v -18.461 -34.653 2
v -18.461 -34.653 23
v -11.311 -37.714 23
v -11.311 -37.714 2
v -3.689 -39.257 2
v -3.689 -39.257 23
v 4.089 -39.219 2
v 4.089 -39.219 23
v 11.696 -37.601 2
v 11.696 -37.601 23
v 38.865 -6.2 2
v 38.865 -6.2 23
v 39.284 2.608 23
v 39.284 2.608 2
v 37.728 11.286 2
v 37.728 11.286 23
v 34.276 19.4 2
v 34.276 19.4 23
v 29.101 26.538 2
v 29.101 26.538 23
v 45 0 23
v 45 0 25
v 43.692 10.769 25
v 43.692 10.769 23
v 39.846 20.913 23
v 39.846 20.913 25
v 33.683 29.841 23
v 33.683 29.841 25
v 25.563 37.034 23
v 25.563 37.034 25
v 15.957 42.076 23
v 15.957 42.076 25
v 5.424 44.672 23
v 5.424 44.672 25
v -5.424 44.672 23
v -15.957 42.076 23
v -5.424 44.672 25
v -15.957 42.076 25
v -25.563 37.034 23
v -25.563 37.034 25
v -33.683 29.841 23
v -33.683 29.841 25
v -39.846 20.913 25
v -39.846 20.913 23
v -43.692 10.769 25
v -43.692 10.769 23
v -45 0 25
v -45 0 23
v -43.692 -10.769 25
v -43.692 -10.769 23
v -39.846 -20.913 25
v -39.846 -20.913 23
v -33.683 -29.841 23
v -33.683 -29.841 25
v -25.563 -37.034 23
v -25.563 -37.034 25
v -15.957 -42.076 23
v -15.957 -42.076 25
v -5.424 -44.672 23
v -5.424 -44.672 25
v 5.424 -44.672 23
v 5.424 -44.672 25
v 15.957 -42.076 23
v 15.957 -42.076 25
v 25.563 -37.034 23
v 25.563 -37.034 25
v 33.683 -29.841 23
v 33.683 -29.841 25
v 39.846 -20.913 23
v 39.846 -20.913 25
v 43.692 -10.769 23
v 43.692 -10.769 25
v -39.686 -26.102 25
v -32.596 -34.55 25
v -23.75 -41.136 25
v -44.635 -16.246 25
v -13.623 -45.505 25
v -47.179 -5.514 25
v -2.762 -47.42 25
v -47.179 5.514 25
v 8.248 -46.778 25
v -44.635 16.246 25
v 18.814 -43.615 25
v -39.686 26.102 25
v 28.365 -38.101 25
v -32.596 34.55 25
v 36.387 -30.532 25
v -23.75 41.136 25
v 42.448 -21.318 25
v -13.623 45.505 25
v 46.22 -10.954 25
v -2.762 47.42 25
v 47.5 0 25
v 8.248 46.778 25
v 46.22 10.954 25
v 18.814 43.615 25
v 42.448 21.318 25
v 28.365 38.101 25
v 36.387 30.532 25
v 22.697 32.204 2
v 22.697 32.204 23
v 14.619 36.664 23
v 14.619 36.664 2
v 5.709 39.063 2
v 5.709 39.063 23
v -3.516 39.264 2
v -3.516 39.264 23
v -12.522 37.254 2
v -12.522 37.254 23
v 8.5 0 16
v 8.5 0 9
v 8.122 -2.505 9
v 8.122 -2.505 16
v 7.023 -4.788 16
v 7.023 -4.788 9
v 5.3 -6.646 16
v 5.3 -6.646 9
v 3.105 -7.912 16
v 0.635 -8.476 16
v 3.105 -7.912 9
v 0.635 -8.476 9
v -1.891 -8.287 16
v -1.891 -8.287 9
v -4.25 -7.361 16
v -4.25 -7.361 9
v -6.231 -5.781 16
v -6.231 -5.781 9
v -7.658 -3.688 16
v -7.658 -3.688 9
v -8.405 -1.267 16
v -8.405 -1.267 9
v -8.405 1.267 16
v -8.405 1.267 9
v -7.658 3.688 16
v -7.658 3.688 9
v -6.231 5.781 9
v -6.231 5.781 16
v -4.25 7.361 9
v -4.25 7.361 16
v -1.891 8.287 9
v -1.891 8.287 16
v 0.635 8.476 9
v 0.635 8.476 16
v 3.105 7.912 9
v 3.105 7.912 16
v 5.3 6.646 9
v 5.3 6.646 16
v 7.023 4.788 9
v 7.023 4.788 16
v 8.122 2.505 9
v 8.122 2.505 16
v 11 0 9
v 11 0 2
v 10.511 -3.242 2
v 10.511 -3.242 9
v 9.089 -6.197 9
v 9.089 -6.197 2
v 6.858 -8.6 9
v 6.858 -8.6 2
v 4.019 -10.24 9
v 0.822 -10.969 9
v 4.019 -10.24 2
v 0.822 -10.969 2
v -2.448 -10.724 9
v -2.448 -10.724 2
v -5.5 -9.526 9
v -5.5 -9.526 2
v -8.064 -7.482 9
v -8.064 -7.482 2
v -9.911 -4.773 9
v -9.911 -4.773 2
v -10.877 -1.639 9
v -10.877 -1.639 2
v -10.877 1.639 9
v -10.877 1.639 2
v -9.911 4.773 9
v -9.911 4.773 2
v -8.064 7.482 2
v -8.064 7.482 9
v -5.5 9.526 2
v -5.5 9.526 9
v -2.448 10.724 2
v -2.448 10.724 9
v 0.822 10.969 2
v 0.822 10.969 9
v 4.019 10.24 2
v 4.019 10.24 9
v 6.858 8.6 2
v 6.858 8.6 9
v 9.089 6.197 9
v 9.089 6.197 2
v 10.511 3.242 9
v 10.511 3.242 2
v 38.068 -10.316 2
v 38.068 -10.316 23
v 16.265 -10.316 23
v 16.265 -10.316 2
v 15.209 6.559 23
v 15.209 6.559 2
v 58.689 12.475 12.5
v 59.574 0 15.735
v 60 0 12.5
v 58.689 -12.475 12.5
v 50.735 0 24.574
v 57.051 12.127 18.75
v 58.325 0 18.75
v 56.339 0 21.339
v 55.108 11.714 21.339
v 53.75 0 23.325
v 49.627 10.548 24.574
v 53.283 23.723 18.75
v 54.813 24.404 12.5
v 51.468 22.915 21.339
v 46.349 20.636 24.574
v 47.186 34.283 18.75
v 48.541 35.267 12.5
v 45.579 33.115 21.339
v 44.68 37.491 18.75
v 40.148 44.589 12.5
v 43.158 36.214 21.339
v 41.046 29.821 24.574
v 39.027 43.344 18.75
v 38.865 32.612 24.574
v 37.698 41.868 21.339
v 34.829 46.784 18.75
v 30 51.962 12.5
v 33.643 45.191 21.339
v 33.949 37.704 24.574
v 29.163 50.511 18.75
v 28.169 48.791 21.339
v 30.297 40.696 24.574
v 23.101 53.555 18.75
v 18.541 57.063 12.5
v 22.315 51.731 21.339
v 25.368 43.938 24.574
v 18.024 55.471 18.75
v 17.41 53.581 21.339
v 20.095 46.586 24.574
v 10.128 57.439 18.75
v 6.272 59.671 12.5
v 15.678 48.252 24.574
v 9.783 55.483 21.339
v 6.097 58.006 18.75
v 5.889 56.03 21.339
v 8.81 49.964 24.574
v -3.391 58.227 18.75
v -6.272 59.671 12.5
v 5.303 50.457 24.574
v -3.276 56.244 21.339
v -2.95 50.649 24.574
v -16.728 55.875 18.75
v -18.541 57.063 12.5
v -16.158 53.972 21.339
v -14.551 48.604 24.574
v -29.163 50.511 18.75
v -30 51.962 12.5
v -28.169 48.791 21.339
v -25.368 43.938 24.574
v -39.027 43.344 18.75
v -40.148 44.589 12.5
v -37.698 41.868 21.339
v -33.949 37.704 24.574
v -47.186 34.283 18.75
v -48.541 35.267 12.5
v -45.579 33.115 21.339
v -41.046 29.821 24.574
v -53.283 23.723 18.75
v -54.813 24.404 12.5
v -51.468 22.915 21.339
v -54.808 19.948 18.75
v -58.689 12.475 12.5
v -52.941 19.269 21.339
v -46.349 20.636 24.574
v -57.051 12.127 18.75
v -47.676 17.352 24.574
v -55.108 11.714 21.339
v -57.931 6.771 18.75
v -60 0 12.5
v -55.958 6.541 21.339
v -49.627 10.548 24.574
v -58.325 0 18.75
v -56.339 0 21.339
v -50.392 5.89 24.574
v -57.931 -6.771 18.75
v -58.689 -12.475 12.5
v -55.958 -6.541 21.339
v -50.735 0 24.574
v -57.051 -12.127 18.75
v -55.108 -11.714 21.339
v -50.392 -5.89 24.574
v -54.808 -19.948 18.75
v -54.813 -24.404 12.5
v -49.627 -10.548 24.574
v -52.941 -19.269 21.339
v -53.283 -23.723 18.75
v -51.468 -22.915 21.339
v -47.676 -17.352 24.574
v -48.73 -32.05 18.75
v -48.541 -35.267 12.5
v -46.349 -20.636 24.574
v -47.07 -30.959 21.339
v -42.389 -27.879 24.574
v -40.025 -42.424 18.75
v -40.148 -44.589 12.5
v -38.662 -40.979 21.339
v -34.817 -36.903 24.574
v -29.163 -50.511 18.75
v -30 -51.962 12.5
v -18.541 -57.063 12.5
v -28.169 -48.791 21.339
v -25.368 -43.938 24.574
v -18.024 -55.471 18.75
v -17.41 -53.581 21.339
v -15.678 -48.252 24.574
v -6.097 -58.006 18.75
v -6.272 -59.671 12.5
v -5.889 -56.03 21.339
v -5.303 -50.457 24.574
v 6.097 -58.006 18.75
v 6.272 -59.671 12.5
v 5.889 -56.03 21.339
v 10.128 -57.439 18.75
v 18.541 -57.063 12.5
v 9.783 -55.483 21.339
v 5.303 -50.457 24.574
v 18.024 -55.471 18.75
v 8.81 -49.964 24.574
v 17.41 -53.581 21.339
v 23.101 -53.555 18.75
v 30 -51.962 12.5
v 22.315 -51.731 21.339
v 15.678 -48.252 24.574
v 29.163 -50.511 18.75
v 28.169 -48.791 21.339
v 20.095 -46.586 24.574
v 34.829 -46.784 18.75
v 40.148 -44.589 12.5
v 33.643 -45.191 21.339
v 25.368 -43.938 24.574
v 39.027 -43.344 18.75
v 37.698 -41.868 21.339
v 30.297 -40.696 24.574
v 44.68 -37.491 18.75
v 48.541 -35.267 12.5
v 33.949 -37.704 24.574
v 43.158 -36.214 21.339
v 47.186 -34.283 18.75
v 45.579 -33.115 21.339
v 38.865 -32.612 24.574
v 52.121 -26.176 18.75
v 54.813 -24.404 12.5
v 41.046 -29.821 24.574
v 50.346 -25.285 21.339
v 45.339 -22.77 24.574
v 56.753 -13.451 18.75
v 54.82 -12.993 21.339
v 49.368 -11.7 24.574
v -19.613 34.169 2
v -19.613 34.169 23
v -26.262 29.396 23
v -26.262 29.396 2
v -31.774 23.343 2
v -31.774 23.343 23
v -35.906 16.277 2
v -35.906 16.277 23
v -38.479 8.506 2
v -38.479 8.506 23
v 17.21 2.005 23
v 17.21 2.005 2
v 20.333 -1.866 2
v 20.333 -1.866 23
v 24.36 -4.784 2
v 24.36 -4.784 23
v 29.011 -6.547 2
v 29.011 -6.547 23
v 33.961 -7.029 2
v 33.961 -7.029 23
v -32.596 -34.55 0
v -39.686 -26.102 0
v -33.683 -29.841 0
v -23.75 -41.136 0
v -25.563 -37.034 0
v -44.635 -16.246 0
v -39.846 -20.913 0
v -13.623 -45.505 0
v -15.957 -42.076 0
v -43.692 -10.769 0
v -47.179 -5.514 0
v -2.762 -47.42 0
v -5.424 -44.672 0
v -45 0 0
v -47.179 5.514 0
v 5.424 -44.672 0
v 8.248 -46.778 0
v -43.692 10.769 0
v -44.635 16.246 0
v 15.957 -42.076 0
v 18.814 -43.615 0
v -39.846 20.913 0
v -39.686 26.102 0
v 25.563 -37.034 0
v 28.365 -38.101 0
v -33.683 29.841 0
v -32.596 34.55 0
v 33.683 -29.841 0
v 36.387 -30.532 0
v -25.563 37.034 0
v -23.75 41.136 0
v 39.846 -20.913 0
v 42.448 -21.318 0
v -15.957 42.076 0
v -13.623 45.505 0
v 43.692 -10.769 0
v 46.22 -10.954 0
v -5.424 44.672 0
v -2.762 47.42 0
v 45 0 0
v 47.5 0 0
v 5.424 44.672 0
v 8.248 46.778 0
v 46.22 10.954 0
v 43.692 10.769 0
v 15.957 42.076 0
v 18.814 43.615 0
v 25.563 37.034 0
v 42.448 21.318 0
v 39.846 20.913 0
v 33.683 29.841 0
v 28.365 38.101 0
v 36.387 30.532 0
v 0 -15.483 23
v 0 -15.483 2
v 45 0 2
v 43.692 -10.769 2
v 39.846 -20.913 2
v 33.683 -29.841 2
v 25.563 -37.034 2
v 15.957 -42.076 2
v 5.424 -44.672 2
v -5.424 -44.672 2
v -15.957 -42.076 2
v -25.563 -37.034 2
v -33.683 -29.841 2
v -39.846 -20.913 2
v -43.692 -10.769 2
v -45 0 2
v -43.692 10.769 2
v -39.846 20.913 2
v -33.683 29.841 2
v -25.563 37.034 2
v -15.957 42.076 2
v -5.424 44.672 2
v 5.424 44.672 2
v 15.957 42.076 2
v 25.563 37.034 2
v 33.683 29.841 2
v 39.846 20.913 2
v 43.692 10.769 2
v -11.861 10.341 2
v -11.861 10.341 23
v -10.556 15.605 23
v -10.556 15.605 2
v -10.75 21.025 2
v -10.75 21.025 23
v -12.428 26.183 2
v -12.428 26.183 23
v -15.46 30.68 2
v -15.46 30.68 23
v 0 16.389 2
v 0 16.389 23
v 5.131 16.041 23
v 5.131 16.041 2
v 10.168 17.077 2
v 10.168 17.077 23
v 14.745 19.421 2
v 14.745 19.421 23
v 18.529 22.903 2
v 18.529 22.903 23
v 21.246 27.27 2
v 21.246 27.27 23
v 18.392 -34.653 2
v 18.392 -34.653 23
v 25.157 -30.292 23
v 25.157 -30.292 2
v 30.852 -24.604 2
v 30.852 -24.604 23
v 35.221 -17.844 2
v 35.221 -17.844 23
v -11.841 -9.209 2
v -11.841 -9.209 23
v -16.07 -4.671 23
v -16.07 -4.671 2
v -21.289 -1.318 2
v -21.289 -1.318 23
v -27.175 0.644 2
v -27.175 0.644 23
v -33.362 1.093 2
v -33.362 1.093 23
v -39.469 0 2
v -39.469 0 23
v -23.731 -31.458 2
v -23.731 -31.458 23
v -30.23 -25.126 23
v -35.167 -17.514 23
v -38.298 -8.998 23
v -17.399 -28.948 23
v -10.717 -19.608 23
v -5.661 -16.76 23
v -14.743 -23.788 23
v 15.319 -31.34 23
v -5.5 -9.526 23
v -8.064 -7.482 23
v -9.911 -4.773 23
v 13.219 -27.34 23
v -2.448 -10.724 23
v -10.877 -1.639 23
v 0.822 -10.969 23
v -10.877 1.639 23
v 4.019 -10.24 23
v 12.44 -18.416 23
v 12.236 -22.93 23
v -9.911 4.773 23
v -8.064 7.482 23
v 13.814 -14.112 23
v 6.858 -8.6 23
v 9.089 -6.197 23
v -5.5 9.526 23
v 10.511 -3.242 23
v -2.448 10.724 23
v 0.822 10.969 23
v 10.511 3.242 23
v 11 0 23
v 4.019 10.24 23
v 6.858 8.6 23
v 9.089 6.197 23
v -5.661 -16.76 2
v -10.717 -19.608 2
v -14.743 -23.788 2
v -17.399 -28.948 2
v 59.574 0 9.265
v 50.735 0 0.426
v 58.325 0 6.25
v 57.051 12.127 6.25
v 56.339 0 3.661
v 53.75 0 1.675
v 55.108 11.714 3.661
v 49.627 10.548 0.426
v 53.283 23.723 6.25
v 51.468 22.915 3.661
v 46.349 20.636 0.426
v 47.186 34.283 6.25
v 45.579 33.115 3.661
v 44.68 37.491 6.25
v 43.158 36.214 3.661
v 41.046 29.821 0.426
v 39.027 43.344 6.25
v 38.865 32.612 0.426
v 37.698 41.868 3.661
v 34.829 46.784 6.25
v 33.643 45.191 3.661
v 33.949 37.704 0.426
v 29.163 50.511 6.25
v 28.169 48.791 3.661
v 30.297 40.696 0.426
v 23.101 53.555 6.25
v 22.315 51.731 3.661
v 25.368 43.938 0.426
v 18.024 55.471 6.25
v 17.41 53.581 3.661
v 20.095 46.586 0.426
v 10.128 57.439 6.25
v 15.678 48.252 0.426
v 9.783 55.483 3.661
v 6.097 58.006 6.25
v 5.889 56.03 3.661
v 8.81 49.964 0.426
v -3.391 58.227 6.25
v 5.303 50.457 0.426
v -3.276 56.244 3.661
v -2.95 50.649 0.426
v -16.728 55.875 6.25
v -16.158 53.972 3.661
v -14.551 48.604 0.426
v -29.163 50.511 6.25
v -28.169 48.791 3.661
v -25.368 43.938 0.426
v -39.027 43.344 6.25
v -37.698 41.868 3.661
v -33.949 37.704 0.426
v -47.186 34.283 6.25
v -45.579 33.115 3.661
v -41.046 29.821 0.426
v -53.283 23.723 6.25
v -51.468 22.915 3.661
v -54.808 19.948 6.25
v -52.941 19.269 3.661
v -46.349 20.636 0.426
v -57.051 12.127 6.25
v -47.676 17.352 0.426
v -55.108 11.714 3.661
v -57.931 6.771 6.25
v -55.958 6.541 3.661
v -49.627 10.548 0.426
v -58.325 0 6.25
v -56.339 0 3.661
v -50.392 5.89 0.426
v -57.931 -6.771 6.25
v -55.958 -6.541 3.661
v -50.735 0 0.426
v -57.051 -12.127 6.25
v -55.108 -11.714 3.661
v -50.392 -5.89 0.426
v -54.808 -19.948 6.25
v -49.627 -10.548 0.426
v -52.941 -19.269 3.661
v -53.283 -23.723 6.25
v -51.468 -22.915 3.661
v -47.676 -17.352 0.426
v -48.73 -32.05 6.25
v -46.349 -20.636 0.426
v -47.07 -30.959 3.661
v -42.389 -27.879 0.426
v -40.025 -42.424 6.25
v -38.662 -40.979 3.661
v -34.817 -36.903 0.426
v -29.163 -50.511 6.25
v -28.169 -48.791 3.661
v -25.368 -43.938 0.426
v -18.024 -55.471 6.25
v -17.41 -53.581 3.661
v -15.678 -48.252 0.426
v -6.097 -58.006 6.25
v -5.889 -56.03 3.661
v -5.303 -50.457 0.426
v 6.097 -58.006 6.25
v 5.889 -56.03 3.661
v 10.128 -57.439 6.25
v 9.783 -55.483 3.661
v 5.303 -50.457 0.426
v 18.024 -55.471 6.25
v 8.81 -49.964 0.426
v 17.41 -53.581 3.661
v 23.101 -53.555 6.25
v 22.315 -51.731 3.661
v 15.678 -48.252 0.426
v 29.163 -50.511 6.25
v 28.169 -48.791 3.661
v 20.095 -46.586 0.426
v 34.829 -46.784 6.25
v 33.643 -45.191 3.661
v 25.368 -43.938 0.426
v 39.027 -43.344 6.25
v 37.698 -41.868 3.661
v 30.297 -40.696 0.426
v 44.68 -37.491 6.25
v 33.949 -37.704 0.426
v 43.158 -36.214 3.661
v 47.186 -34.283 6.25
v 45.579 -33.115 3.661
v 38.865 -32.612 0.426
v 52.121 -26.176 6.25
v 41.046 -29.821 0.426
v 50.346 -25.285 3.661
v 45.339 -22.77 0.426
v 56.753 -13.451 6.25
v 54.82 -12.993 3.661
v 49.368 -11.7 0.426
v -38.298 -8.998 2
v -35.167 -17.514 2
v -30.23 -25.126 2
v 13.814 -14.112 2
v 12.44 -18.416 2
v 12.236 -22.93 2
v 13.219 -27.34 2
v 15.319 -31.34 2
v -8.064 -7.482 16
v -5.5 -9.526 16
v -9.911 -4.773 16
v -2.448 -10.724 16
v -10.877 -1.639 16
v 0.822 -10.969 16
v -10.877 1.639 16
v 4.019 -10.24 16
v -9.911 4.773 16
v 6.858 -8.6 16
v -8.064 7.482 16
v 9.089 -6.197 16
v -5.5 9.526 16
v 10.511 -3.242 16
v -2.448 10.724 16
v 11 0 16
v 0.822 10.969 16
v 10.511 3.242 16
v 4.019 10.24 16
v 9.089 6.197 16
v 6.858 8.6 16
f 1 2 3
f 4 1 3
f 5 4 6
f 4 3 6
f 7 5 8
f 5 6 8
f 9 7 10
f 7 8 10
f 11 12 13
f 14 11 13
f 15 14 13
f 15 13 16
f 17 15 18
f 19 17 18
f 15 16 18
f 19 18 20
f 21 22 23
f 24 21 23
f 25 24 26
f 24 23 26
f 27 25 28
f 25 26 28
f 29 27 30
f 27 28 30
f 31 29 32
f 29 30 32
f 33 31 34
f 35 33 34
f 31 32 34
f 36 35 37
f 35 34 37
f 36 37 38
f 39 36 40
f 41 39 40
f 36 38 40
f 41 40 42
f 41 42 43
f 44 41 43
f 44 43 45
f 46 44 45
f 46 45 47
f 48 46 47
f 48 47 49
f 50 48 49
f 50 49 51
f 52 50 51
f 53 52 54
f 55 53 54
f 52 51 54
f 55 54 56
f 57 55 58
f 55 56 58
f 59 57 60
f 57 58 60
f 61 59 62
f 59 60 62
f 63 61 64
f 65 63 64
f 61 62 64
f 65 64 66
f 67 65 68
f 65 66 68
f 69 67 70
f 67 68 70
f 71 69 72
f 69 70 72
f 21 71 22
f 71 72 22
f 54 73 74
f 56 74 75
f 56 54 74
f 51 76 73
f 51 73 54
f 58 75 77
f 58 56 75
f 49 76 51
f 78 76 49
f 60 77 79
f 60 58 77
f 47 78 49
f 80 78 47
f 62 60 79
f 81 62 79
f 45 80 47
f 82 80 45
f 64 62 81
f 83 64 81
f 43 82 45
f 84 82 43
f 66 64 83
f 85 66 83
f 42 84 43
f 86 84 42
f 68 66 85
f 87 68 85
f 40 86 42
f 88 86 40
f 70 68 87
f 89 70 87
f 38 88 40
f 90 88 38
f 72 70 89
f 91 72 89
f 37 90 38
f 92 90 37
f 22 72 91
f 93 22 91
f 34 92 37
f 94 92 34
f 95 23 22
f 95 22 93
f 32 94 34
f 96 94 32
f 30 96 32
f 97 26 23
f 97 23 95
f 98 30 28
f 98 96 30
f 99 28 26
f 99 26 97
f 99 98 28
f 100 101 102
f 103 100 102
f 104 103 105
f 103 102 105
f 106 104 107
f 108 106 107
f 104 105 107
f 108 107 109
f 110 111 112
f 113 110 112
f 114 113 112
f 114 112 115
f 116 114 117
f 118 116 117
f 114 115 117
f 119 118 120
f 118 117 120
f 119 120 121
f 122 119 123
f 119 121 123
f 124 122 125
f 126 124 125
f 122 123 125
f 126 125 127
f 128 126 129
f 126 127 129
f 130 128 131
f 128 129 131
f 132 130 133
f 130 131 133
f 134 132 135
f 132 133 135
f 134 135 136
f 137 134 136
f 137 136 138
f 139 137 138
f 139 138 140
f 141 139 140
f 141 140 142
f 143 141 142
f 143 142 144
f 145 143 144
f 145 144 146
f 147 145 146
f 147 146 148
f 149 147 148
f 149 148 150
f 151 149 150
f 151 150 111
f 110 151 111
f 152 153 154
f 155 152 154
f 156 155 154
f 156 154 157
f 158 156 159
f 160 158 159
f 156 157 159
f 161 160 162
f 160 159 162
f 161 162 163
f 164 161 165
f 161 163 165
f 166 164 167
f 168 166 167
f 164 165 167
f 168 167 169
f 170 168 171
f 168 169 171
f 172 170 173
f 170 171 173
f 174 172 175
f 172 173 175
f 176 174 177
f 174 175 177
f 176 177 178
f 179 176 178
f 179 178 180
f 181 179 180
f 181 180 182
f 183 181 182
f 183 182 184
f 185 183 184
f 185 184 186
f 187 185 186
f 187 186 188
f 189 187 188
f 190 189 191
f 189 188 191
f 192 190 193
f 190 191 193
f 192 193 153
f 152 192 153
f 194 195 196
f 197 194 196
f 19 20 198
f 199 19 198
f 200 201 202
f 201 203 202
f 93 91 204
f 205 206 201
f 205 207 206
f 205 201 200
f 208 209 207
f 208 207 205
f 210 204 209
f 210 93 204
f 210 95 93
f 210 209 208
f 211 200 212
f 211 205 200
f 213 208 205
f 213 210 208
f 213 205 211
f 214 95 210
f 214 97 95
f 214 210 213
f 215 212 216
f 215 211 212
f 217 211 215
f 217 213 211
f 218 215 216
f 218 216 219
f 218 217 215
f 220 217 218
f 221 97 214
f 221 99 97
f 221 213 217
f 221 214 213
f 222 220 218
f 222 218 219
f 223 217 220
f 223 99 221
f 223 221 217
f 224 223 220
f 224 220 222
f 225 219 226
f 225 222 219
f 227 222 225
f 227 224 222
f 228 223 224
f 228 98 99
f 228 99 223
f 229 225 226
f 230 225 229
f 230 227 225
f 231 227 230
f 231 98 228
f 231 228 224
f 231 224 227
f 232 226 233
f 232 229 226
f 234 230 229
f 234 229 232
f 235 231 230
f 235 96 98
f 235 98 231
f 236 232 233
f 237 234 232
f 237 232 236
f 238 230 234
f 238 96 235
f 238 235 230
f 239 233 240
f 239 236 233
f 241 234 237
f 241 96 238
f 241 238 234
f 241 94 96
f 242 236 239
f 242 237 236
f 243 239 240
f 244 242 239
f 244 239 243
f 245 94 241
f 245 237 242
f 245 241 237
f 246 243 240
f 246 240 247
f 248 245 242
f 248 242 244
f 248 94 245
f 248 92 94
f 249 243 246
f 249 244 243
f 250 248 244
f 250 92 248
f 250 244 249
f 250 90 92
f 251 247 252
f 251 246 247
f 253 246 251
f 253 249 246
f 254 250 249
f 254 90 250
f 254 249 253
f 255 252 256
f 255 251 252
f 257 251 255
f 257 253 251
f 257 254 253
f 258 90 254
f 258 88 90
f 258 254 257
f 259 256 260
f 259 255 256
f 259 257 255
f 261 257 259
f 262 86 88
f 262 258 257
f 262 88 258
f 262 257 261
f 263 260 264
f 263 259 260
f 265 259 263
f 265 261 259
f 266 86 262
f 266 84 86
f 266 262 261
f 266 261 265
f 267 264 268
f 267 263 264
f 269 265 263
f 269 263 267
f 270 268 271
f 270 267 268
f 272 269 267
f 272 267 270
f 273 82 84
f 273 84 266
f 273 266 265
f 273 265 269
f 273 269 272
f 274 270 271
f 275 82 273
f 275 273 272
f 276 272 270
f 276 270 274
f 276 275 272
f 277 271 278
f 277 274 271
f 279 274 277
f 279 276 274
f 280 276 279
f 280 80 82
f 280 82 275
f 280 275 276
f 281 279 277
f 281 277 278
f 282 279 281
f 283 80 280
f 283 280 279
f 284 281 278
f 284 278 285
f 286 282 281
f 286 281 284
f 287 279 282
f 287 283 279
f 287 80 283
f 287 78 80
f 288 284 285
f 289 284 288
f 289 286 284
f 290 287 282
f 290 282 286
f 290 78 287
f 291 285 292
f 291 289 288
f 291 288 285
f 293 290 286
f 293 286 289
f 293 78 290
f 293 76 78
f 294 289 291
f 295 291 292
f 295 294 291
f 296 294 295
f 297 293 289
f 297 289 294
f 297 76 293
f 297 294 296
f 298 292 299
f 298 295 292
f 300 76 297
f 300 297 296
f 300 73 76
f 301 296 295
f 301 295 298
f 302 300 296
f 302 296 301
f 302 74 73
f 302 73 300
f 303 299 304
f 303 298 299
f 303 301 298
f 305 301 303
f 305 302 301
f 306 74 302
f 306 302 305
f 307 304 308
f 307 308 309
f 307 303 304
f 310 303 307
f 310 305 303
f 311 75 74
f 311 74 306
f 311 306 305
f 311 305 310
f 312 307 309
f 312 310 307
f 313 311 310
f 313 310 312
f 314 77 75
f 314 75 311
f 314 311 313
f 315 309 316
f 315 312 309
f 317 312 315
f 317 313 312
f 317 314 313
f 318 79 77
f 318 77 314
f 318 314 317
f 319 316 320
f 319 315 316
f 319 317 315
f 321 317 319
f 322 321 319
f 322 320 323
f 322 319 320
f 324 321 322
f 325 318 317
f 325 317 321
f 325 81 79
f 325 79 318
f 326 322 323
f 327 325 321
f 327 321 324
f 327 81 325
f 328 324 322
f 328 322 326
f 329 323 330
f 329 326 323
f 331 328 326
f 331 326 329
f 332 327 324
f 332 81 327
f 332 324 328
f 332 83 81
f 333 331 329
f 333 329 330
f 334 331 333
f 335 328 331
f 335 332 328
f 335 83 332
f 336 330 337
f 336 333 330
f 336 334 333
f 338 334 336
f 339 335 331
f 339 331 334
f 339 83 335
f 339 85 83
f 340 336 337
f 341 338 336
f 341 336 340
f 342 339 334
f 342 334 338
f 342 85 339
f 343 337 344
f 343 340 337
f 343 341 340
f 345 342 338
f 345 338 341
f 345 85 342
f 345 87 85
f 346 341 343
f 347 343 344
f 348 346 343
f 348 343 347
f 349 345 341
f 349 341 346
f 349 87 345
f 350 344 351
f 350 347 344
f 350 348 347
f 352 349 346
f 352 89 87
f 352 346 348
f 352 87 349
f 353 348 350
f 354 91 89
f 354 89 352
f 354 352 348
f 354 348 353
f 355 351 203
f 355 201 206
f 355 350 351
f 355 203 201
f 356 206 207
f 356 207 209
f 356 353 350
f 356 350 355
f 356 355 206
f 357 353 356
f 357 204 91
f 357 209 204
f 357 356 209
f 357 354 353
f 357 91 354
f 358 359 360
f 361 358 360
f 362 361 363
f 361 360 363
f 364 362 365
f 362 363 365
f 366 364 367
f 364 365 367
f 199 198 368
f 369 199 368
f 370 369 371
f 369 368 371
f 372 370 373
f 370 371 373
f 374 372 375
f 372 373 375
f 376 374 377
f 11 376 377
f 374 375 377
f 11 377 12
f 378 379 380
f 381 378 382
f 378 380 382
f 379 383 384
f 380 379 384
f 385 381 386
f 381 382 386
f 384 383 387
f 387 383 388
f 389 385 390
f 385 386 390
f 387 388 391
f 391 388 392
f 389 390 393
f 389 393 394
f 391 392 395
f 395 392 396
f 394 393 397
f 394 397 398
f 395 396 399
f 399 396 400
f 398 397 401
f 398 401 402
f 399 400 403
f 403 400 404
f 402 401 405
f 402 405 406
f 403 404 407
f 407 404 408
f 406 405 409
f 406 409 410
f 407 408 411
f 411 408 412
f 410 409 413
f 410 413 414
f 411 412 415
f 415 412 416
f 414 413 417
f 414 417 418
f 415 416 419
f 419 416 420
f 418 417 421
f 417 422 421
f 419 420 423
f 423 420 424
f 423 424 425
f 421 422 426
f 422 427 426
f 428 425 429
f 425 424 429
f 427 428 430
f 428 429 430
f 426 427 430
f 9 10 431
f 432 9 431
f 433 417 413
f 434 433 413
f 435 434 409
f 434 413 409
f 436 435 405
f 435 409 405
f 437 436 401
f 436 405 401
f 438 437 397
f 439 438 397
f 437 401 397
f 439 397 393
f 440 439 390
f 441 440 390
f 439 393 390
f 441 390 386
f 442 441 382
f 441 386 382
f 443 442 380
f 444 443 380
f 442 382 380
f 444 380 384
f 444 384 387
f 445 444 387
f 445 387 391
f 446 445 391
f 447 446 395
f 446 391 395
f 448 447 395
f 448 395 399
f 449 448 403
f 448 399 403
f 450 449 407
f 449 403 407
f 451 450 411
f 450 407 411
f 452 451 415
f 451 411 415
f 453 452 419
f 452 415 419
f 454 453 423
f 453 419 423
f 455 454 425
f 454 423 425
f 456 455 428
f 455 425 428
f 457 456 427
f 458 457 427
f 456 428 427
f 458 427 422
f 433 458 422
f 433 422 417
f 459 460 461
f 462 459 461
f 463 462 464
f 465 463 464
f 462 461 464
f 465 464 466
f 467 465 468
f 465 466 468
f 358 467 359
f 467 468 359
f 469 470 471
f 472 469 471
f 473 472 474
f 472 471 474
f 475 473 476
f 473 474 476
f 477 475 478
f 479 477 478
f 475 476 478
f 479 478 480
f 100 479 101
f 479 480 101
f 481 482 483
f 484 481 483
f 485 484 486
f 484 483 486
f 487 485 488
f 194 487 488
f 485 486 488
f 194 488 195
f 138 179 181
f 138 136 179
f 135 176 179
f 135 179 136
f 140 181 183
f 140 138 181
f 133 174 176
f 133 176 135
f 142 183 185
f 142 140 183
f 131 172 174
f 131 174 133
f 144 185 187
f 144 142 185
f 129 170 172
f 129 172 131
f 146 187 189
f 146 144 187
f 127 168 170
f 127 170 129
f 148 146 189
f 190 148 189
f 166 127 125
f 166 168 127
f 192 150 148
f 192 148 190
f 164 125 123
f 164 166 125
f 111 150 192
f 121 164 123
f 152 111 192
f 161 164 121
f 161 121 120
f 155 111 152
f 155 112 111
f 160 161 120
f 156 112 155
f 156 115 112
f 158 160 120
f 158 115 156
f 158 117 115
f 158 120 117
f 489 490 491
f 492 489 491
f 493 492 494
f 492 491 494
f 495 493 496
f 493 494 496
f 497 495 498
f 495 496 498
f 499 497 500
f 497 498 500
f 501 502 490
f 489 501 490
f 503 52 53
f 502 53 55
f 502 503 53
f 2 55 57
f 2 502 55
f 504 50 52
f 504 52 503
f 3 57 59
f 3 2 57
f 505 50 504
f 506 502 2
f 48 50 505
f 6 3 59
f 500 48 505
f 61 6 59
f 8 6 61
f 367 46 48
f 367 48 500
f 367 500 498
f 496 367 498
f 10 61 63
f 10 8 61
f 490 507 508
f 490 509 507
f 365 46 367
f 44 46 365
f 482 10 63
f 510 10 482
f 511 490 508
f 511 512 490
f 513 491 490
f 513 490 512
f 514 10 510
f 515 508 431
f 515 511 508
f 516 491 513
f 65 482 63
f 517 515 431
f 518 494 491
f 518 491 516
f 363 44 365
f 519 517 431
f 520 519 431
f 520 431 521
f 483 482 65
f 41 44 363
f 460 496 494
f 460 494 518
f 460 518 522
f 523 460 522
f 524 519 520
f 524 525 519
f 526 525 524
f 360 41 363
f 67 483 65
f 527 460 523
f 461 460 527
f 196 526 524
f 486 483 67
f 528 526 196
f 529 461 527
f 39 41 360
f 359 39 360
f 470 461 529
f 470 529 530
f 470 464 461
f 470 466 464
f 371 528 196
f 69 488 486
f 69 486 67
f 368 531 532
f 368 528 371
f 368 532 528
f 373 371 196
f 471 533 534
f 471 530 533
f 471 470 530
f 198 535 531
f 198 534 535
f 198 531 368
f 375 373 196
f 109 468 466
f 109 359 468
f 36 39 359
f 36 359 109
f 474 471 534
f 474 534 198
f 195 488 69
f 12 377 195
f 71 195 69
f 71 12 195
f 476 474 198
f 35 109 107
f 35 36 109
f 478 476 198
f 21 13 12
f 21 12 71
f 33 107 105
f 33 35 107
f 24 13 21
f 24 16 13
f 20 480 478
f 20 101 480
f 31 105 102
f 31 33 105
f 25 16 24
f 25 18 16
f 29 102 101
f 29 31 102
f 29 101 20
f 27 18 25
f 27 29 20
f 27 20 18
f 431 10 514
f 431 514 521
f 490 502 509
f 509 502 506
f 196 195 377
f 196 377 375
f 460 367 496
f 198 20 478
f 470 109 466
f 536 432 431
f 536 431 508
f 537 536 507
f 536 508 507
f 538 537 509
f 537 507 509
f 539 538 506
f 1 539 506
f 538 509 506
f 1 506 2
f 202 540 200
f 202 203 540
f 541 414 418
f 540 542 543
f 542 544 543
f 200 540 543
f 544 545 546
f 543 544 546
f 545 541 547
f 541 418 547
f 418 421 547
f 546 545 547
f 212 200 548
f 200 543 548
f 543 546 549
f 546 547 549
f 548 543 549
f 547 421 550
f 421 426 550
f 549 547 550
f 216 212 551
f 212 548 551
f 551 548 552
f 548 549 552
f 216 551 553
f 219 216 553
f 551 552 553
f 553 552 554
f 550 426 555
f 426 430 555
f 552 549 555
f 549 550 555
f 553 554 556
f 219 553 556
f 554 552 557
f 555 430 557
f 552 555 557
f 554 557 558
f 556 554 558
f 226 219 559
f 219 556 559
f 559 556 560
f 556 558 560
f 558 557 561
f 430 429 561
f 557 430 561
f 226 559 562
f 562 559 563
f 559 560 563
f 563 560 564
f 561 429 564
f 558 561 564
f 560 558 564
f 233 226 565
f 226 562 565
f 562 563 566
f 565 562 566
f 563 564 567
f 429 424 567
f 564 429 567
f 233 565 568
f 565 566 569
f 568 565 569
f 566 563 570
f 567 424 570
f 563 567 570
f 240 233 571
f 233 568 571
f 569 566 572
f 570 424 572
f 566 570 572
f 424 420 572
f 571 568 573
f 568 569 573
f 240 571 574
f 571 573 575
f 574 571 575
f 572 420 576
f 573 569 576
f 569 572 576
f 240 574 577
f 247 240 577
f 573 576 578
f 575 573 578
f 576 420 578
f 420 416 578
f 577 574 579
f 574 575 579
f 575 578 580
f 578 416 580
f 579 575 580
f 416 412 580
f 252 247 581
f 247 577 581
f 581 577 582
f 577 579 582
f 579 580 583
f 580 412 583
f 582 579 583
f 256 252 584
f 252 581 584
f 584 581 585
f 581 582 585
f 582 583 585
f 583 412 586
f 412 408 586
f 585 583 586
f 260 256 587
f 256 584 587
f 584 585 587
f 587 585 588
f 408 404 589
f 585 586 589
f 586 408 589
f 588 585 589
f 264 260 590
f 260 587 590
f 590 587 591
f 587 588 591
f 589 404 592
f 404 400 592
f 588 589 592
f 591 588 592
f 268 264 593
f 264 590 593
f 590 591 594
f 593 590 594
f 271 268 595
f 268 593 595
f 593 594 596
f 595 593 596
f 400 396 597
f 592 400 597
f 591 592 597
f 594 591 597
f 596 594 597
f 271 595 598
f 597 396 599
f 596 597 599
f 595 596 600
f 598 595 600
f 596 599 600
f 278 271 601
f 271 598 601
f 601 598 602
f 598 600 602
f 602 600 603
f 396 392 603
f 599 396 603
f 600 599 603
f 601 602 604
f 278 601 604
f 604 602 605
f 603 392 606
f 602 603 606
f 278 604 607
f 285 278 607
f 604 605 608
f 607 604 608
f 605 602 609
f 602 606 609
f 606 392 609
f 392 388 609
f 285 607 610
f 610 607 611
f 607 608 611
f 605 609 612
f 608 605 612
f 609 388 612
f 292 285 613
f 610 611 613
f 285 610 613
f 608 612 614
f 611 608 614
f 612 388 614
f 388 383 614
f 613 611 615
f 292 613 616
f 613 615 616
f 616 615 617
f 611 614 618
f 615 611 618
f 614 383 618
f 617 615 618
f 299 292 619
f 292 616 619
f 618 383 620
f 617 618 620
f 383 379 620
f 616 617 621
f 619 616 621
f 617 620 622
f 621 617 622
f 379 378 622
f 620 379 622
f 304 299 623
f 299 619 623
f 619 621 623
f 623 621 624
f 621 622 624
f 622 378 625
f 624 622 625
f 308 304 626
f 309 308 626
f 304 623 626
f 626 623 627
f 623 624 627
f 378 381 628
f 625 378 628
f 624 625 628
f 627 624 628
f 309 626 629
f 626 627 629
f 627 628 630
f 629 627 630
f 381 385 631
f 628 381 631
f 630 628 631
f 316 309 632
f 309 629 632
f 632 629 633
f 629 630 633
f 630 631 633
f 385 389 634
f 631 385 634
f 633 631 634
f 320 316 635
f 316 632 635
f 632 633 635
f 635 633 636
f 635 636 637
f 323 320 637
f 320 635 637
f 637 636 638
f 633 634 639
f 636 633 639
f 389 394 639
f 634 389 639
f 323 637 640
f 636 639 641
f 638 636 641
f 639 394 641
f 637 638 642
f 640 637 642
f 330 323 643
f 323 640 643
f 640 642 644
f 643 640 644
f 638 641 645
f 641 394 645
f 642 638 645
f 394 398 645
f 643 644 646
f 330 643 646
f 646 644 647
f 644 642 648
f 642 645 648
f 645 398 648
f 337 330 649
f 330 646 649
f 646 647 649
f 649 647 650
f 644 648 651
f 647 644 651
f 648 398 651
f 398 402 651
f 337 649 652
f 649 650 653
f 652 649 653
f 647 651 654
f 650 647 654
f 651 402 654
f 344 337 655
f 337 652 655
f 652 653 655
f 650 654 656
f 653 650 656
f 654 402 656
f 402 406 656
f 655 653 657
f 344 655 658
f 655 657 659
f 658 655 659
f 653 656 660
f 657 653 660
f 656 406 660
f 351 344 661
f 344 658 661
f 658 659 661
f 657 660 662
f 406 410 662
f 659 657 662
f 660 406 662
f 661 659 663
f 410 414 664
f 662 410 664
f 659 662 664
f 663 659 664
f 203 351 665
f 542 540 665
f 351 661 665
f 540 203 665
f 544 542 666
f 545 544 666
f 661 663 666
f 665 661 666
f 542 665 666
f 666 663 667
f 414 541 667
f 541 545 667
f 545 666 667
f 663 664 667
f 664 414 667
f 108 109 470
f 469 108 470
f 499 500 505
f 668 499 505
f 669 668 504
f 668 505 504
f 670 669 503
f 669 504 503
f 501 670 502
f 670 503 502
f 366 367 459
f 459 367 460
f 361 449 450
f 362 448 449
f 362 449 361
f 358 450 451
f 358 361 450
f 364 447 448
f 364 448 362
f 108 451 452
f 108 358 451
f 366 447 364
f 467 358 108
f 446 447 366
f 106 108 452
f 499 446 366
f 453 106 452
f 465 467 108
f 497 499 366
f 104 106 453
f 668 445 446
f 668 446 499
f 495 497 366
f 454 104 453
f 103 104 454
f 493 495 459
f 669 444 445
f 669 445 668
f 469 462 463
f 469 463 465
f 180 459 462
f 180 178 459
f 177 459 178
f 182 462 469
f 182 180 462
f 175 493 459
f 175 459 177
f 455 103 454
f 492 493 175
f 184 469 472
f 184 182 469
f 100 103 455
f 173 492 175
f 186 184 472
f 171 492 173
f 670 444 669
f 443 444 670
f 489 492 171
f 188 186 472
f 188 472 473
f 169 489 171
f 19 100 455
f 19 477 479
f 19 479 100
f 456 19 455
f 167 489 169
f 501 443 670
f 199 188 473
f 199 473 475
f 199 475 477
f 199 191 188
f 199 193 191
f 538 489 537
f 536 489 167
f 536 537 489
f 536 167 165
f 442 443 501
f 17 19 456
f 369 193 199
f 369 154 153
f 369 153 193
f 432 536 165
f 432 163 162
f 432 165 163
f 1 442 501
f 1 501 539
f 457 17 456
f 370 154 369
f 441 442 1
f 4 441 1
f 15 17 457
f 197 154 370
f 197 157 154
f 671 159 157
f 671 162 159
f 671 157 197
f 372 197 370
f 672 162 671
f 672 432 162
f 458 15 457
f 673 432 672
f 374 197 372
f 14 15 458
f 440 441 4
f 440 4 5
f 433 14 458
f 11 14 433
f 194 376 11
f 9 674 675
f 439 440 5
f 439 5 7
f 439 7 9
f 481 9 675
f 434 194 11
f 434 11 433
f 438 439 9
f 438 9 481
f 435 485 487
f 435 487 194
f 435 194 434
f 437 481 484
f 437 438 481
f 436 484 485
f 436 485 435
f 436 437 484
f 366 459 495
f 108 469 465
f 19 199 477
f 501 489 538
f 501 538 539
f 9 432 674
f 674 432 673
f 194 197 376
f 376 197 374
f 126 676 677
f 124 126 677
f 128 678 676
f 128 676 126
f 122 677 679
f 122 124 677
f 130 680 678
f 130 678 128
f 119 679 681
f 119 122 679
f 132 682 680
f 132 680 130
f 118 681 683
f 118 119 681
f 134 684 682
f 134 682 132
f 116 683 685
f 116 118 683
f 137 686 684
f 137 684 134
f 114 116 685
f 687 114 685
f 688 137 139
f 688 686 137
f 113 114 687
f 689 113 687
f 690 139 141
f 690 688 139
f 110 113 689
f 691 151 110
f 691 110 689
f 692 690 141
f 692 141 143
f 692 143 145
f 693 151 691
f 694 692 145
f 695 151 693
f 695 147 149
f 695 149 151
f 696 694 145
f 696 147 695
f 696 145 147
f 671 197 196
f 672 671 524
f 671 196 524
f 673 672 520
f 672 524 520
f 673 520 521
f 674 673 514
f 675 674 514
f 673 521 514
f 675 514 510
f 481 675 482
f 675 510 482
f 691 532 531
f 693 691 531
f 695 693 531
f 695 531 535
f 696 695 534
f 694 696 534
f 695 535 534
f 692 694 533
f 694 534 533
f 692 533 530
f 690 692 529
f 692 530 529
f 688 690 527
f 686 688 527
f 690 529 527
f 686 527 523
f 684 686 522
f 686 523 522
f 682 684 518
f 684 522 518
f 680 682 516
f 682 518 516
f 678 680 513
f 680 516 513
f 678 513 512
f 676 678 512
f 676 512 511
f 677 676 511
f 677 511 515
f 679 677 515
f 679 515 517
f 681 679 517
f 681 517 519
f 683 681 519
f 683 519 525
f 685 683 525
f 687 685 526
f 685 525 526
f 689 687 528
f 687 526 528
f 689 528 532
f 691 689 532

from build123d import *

# Parameters (mm, degrees)
F0_R      = 60
F1_DEPTH  = 25
F2_R      = 45
F3_DEPTH  = 2
F4_R      = 11
F5_DEPTH  = 7
F6_R      = 45
F7_DEPTH  = 2
F8_R      = 11
F9_DEPTH  = 7
F10_R     = 8.5
F11_DEPTH = 25
F12_R     = 12.49999
F16_DEPTH = 25


# Not quite as in the source:
# - a fillet or chamfer is up to 0.001 mm smaller than in the source, because OpenCascade refuses the exact size


with BuildPart() as f1:
    # F0 (on Top) → F1 (new body)
    with BuildSketch(Plane.XY):
        Circle(F0_R)
    extrude(amount=F1_DEPTH)

    # F2 (on face) → F3 (cut)
    with BuildSketch(Plane.XY.offset(25)):
        Circle(F2_R)
    extrude(amount=-F3_DEPTH, mode=Mode.SUBTRACT)

    # F4 (on face) → F5 (cut)
    with BuildSketch(Plane.XY.offset(23)):
        Circle(F4_R)
    extrude(amount=-F5_DEPTH, mode=Mode.SUBTRACT)

    # F6 (on face) → F7 (cut)
    with BuildSketch(Plane(origin=(0, 0, 0), x_dir=(1, 0, 0), z_dir=(0, 0, -1))):
        Circle(F6_R)
    extrude(amount=-F7_DEPTH, mode=Mode.SUBTRACT)

    # F8 (on face) → F9 (cut)
    with BuildSketch(Plane(origin=(0, 0, 2), x_dir=(1, 0, 0), z_dir=(0, 0, -1))):
        Circle(F8_R)
    extrude(amount=-F9_DEPTH, mode=Mode.SUBTRACT)

    # F10 (on face) → F11 (cut)
    with BuildSketch(Plane(origin=(0, 0, 9), x_dir=(1, 0, 0), z_dir=(0, 0, -1))):
        Circle(F10_R)
    extrude(amount=-F11_DEPTH, mode=Mode.SUBTRACT)

    # F12 (radius 12.5 in the source; OpenCascade refuses exactly that, so slightly less here)
    f12_edges = [f1.edges().sort_by_distance(p)[0] for p in [
        (-60, 0, 25),
        (-60, 0, 0),
    ]]
    fillet(f12_edges, radius=F12_R)

    # F15 (on face) → F16 (cut)
    with BuildSketch(Plane.XY.offset(23)):
        with BuildLine():
            Line((-23.7309150398, -31.4583554864), (-11.8406927213, -9.2094279826))
            ThreePointArc((-11.8406927213, -9.2094279826), (-24.1709240611, -0.1529805421), (-39.4689776003, 0))
            ThreePointArc((-39.4689776003, 0), (-35.1668885168, -17.5136562569), (-23.7309150398, -31.4583554864))
        make_face()
        with BuildLine():
            Line((11.6958646104, -37.6011095941), (0, -15.4828215018))
            ThreePointArc((0, -15.4828215018), (-12.8825559704, -21.5513966495), (-18.4614025056, -34.6534699202))
            ThreePointArc((-18.4614025056, -34.6534699202), (-3.6886632813, -39.2568911162), (11.6958646104, -37.6011095941))
        make_face()
        with BuildLine():
            Line((38.0679219961, -10.3157823905), (16.2651948631, -10.3157823905))
            ThreePointArc((16.2651948631, -10.3157823905), (12.2364949642, -22.929504934), (18.3915793896, -34.6534699202))
            ThreePointArc((18.3915793896, -34.6534699202), (30.8515845586, -24.6043058224), (38.0679219961, -10.3157823905))
        make_face()
        with BuildLine():
            Line((29.1008390486, 26.5384856611), (15.2093013749, 6.5587405115))
            ThreePointArc((15.2093013749, 6.5587405115), (24.360120091, -4.7843640185), (38.8653166592, -6.1995587312))
            ThreePointArc((38.8653166592, -6.1995587312), (37.7282086233, 11.2864894274), (29.1008390486, 26.5384856611))
        make_face()
        with BuildLine():
            Line((-12.5216757879, 37.253908813), (0, 16.3887739182))
            ThreePointArc((0, 16.3887739182), (14.7450774696, 19.4214078257), (22.6965453476, 32.2037525475))
            ThreePointArc((22.6965453476, 32.2037525475), (5.7090018341, 39.0634462479), (-12.5216757879, 37.253908813))
        make_face()
        with BuildLine():
            Line((-38.4788028896, 8.5062459111), (-11.8609527126, 10.3406049311))
            ThreePointArc((-11.8609527126, 10.3406049311), (-11.4093820553, 23.6626254803), (-19.6125917137, 34.1691710055))
            ThreePointArc((-19.6125917137, 34.1691710055), (-31.7739639836, 23.3434055945), (-38.4788028896, 8.5062459111))
        make_face()
    extrude(amount=-F16_DEPTH, mode=Mode.SUBTRACT)


solid = f1.part
